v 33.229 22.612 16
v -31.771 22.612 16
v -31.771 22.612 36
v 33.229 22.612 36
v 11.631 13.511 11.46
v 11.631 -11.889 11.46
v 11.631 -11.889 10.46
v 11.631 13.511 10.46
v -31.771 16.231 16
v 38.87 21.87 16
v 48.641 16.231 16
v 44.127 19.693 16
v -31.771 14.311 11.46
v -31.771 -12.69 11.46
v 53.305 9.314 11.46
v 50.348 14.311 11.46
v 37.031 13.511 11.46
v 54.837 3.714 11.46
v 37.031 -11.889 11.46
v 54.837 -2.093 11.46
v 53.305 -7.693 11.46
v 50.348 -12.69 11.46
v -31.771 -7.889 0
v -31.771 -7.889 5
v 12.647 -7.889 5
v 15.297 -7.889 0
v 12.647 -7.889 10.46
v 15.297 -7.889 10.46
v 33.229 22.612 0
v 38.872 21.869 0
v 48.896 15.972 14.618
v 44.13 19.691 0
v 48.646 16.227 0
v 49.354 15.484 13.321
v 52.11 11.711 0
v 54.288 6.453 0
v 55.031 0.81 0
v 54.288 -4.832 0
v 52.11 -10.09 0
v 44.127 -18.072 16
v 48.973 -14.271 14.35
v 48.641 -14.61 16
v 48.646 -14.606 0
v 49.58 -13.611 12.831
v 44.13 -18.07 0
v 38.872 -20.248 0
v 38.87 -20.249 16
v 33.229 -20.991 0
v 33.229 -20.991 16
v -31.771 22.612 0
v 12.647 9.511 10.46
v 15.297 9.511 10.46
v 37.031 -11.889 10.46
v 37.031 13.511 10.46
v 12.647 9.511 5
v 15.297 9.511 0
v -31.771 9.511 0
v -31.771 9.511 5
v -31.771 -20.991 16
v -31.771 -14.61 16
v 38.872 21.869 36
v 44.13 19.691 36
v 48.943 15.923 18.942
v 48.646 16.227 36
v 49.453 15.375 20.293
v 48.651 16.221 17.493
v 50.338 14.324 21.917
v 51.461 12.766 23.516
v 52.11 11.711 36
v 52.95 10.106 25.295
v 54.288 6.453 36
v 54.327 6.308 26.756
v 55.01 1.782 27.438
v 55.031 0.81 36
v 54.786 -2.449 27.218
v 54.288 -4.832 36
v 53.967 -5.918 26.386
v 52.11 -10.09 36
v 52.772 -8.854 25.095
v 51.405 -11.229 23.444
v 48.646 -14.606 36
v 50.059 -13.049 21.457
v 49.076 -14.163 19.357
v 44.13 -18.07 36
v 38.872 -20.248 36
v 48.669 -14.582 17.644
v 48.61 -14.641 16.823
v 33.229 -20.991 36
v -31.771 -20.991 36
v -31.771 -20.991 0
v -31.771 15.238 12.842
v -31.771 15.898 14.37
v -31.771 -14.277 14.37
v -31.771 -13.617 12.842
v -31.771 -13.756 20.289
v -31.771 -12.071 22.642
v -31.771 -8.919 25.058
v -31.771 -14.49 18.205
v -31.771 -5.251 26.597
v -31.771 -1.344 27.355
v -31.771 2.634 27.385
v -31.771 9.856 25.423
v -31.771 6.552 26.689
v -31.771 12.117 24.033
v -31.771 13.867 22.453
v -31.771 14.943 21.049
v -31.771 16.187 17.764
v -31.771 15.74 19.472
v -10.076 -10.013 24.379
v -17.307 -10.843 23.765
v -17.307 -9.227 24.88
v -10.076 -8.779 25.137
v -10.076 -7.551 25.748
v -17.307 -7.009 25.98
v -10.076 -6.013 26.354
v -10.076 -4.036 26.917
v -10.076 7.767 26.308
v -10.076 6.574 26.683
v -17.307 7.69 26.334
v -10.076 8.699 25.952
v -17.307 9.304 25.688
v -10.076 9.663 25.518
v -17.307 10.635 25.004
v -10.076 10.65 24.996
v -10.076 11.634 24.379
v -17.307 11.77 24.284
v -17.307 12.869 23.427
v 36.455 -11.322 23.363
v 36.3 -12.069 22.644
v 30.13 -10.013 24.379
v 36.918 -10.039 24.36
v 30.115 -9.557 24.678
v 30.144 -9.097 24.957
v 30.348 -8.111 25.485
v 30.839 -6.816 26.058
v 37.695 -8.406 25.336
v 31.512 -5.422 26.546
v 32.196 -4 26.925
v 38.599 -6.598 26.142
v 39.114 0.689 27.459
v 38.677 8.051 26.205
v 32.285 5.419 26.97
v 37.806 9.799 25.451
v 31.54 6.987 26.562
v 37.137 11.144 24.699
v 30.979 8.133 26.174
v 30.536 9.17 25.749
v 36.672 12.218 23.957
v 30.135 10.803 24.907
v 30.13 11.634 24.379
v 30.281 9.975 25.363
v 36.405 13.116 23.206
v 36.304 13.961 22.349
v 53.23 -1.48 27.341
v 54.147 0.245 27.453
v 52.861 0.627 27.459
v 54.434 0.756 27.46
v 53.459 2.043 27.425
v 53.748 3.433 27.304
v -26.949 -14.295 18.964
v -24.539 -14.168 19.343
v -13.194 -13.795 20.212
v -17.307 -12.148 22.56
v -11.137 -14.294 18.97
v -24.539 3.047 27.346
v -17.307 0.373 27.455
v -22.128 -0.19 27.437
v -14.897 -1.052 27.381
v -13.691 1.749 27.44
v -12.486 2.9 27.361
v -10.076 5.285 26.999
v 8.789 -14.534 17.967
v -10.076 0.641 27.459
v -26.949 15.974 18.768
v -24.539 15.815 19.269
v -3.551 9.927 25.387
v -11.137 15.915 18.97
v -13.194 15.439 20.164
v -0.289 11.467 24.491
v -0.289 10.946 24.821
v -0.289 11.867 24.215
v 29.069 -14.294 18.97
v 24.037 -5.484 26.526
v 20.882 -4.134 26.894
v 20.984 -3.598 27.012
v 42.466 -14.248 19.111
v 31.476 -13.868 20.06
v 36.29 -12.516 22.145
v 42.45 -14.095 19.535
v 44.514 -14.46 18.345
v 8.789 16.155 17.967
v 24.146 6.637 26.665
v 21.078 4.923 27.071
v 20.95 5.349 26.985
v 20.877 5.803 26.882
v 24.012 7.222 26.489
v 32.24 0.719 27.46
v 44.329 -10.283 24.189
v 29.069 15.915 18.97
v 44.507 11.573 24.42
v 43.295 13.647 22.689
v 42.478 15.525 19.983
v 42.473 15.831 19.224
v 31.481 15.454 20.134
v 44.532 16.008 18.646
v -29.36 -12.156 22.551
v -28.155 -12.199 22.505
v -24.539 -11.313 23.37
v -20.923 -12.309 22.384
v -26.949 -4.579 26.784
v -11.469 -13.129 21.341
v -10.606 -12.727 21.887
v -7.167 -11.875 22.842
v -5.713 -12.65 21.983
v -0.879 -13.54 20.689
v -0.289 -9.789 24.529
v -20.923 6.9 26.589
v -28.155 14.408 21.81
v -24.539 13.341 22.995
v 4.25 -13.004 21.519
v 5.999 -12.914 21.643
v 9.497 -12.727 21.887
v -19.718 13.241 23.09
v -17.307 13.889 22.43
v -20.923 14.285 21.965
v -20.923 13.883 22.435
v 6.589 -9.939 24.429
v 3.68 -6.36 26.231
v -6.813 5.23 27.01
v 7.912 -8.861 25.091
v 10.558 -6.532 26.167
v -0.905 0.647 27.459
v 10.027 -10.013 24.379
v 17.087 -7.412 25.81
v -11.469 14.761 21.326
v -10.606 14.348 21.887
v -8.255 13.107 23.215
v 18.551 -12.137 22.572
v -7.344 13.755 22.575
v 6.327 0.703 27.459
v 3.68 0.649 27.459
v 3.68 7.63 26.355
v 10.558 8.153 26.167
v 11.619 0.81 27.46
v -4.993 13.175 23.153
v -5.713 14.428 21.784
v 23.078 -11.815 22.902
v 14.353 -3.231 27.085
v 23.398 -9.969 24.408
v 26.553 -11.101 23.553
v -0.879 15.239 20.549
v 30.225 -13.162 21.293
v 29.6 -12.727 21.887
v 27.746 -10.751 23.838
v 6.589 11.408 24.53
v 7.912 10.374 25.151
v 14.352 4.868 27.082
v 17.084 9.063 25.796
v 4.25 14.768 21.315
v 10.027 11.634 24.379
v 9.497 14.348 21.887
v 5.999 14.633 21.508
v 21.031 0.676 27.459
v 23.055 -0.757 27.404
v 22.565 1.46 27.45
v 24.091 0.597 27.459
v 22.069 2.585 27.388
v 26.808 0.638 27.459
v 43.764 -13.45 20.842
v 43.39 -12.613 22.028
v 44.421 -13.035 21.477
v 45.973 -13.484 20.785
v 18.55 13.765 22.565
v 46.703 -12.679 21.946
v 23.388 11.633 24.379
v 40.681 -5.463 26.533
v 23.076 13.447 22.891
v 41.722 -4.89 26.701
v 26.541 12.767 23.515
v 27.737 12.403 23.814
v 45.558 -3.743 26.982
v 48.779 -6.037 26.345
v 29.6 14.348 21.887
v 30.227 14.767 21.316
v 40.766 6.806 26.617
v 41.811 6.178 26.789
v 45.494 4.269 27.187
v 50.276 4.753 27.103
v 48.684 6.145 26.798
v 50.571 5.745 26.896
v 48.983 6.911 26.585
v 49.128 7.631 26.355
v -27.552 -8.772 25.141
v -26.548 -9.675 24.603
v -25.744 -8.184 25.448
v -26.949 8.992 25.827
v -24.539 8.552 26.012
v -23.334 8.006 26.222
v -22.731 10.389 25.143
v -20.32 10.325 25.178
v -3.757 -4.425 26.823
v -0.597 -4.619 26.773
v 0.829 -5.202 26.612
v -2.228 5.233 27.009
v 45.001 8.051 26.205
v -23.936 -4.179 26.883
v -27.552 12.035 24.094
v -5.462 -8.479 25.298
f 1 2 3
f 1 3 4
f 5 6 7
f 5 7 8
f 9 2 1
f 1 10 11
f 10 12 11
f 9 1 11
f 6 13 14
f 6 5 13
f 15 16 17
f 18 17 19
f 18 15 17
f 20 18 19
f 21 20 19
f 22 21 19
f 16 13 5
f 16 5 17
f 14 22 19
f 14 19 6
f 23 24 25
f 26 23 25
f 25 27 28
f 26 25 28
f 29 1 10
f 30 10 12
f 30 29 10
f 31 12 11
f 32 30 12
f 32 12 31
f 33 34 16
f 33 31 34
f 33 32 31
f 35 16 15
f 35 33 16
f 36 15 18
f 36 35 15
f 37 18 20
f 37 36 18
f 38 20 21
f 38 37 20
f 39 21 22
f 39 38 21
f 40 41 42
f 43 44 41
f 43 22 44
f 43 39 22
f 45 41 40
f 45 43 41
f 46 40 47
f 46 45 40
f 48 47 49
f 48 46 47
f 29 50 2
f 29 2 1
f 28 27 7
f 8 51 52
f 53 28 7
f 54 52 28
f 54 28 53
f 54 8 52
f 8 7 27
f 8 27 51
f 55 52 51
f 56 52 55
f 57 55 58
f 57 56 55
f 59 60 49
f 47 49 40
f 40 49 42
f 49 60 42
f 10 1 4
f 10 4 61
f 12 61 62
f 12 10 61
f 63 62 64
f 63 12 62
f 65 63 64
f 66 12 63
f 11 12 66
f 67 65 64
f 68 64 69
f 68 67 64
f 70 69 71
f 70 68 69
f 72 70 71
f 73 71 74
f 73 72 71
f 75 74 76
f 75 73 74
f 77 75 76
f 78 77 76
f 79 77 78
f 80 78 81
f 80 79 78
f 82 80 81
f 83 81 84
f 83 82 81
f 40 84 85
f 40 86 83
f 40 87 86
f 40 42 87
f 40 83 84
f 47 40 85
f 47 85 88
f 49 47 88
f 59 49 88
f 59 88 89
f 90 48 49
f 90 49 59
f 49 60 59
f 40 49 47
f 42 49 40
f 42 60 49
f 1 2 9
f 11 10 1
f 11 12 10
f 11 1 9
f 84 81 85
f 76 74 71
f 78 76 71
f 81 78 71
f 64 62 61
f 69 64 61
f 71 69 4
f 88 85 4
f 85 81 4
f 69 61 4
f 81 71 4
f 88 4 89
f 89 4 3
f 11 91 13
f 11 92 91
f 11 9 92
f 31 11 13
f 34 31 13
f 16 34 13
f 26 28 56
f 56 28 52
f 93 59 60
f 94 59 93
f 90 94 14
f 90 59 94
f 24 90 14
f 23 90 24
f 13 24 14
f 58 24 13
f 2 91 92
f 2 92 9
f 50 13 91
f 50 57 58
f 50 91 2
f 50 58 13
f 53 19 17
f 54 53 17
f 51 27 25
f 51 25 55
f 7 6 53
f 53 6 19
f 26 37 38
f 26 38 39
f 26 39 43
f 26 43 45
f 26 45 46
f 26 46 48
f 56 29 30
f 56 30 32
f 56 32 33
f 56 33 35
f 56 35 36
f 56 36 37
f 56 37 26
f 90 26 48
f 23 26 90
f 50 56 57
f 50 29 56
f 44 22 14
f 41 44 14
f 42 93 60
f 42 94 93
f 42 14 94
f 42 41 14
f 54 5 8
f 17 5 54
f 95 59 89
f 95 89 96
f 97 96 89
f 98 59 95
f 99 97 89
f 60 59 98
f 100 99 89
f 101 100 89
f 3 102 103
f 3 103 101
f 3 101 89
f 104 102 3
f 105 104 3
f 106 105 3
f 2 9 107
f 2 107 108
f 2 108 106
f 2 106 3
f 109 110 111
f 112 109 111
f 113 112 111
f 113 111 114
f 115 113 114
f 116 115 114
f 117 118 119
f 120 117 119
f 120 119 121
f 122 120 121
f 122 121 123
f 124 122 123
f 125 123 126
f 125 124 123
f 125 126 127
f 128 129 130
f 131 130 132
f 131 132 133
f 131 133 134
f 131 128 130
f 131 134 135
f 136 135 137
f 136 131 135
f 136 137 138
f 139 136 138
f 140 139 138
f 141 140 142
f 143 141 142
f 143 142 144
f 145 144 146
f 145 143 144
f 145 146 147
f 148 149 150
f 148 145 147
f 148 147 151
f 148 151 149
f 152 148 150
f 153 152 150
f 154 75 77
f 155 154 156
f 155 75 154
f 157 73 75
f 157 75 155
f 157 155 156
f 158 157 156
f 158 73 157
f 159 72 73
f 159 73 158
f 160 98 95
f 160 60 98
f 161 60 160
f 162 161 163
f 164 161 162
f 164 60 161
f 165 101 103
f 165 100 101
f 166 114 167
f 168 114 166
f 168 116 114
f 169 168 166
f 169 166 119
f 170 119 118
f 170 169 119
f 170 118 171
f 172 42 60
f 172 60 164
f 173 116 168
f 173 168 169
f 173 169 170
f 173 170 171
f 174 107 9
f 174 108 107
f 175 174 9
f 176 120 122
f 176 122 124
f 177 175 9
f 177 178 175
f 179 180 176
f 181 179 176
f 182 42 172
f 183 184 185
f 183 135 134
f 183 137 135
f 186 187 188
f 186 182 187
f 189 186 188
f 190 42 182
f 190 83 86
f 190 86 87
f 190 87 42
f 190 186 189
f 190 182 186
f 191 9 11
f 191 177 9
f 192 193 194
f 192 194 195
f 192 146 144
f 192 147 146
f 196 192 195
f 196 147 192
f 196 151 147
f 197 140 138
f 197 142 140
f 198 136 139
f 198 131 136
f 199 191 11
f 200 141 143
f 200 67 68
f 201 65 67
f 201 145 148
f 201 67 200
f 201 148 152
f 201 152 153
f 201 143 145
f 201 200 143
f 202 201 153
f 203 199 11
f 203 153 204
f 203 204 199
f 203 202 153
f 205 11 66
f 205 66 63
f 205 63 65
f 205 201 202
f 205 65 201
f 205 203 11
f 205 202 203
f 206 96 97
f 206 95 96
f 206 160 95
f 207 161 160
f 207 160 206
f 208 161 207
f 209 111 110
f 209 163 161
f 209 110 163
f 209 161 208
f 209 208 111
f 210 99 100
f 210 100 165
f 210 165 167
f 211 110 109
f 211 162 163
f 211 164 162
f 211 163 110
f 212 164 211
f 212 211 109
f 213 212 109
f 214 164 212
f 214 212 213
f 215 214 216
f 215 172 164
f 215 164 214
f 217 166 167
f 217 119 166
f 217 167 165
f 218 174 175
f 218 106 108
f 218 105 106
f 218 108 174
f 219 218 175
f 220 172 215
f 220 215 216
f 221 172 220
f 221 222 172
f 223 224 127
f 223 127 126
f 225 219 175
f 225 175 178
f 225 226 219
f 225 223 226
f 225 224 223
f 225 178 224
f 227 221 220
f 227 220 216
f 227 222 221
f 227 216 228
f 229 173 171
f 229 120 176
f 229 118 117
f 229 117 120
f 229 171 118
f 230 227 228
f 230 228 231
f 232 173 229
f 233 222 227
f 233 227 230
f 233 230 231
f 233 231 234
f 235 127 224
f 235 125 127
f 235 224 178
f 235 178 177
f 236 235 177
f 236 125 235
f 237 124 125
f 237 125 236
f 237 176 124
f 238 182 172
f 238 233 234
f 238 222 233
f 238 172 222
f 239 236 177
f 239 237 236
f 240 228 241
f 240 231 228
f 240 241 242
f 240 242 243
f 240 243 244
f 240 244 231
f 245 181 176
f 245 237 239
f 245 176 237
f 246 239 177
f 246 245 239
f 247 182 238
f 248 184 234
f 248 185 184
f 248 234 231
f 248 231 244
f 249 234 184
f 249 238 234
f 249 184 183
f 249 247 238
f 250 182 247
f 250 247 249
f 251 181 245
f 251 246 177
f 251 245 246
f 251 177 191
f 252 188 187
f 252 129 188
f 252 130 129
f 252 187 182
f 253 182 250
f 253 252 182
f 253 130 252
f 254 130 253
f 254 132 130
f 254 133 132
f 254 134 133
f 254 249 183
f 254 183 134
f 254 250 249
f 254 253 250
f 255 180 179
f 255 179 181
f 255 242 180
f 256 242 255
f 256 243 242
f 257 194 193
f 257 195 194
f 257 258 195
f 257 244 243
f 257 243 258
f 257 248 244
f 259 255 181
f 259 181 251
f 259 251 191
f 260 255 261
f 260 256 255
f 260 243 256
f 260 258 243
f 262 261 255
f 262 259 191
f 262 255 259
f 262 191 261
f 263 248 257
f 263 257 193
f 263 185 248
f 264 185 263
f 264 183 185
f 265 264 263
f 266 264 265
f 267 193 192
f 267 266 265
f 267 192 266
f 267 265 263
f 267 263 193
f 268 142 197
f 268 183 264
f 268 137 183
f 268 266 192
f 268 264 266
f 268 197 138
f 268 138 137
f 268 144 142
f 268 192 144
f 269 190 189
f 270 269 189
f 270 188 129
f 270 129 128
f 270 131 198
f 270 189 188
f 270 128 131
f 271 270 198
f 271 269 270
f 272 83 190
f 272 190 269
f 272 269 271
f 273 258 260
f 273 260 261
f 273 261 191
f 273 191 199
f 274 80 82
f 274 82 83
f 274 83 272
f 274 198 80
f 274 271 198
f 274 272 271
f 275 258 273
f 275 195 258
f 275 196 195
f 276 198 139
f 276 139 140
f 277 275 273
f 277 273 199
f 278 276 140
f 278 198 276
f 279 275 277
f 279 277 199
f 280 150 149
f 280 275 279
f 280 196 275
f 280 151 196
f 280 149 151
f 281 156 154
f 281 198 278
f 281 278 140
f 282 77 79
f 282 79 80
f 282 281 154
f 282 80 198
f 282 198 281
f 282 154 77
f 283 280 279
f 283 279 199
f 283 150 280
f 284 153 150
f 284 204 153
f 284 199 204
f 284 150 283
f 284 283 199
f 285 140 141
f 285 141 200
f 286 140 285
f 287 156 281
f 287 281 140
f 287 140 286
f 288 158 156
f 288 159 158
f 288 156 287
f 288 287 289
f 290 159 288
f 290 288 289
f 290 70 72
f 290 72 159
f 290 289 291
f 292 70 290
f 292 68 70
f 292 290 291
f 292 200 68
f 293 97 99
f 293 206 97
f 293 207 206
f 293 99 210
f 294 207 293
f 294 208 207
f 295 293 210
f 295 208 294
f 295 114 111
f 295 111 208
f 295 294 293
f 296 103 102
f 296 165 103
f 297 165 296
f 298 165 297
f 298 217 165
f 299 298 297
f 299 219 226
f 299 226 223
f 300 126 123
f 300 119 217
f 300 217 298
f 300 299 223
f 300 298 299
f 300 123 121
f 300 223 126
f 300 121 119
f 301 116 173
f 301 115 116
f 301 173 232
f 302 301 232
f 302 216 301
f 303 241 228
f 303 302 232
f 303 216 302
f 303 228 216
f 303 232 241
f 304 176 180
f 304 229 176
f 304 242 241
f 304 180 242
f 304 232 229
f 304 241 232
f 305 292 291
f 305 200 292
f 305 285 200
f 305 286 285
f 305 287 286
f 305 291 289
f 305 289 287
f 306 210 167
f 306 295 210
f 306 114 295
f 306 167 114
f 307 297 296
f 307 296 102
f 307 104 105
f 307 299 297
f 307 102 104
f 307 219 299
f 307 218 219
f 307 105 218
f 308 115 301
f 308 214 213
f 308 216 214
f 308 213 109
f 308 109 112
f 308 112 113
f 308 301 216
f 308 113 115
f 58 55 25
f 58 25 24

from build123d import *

# Parameters (mm, degrees)
ESTRUSIONE_ESTRUSIONE1_DEPTH  = 36
TAGLIO_ESTRUSIONE1_DEPTH      = 1
TAGLIO_ESTRUSIONE1_DEPTH_BACK = 92
SCHIZZO8_W                    = 25.4
SCHIZZO8_H                    = 25.4
TAGLIO_ESTRUSIONE2_DEPTH      = 1
SCHIZZO10_W                   = 2.65
SCHIZZO10_H                   = 17.4
TAGLIO_ESTRUSIONE3_DEPTH      = 25
SCHIZZO14_W                   = 44.417937998
SCHIZZO14_H                   = 17.4
TAGLIO_ESTRUSIONE5_DEPTH      = 5


with BuildPart() as part:
    # Schizzo1 → Estrusione-Estrusione1 (new body)
    with BuildSketch(Plane.XY):
        with BuildLine():
            Line((-31.770573566, 22.612219451), (33.229426434, 22.612219451))
            ThreePointArc((33.229426434, 22.612219451), (55.03117207, 0.810473815), (33.229426434, -20.99127182))
            Line((33.229426434, -20.99127182), (-31.770573566, -20.99127182))
            Line((-31.770573566, -20.99127182), (-31.770573566, 22.612219451))
        make_face()
    extrude(amount=ESTRUSIONE_ESTRUSIONE1_DEPTH)

    # Schizzo6 → Taglio-Estrusione1 (cut, two sides: drawn at the far end of the back side and taken through both)
    with BuildSketch(Plane.ZY.offset(31.770573566).offset(-TAGLIO_ESTRUSIONE1_DEPTH_BACK)):
        with BuildLine():
            Line((11.459722367, 14.310835411), (11.459722367, -12.68988778))
            add(Edge.make_bspline(
                [(11.459722367, -12.68988778), (14.702499557, -15.282629715), (20.39322805, -16.919759668), (25.687174992, -12.452872294), (27.459722367, -4.518434658), (27.459722367, 6.139382289), (25.687174992, 14.073819925), (20.39322805, 18.540707299), (14.702499557, 16.903577345), (11.459722367, 14.310835411)],
                knots=[2.633464466, 2.633464466, 2.633464466, 2.633464466, 2.633464466, 2.633464466, 4.71238898, 4.71238898, 4.71238898, 4.71238898, 6.791313494, 6.791313494, 6.791313494, 6.791313494, 6.791313494, 6.791313494], degree=5, weights=[1, 1, 0.902655704, 0.902655704, 1, 1, 0.902655704, 0.902655704, 1, 1]))
        make_face()
    extrude(amount=TAGLIO_ESTRUSIONE1_DEPTH + TAGLIO_ESTRUSIONE1_DEPTH_BACK, mode=Mode.SUBTRACT)


with BuildPart() as body_2:
    # Dividi4: the piece on the far side of the plane
    add(part.part)
    split(bisect_by=Plane.XY.offset(16), keep=Keep.BOTTOM)

    # Schizzo8 → Taglio-Estrusione2 (cut)
    with BuildSketch(Plane.XY.offset(11.459722367)):
        with Locations((24.33117207, 0.810835411)):
            Rectangle(SCHIZZO8_W, SCHIZZO8_H)
    extrude(amount=-TAGLIO_ESTRUSIONE2_DEPTH, mode=Mode.SUBTRACT)

    # Schizzo10 → Taglio-Estrusione3 (cut)
    with BuildSketch(Plane.XY.offset(10.459722367)):
        with Locations((13.972364432, 0.810835411)):
            Rectangle(SCHIZZO10_W, SCHIZZO10_H)
    extrude(amount=-TAGLIO_ESTRUSIONE3_DEPTH, mode=Mode.SUBTRACT)

    # Schizzo14 → Taglio-Estrusione5 (cut)
    with BuildSketch(Plane(origin=(0, 0, 0), x_dir=(-1, 0, 0), z_dir=(0, 0, -1))):
        with Locations((9.561604567, 0.810835411)):
            Rectangle(SCHIZZO14_W, SCHIZZO14_H)
    extrude(amount=-TAGLIO_ESTRUSIONE5_DEPTH, mode=Mode.SUBTRACT)


with BuildPart() as part_1:
    add(part.part)

    # Dividi4
    split(bisect_by=Plane.XY.offset(16), keep=Keep.TOP)


solid = Compound([body_2.part, part_1.part])
